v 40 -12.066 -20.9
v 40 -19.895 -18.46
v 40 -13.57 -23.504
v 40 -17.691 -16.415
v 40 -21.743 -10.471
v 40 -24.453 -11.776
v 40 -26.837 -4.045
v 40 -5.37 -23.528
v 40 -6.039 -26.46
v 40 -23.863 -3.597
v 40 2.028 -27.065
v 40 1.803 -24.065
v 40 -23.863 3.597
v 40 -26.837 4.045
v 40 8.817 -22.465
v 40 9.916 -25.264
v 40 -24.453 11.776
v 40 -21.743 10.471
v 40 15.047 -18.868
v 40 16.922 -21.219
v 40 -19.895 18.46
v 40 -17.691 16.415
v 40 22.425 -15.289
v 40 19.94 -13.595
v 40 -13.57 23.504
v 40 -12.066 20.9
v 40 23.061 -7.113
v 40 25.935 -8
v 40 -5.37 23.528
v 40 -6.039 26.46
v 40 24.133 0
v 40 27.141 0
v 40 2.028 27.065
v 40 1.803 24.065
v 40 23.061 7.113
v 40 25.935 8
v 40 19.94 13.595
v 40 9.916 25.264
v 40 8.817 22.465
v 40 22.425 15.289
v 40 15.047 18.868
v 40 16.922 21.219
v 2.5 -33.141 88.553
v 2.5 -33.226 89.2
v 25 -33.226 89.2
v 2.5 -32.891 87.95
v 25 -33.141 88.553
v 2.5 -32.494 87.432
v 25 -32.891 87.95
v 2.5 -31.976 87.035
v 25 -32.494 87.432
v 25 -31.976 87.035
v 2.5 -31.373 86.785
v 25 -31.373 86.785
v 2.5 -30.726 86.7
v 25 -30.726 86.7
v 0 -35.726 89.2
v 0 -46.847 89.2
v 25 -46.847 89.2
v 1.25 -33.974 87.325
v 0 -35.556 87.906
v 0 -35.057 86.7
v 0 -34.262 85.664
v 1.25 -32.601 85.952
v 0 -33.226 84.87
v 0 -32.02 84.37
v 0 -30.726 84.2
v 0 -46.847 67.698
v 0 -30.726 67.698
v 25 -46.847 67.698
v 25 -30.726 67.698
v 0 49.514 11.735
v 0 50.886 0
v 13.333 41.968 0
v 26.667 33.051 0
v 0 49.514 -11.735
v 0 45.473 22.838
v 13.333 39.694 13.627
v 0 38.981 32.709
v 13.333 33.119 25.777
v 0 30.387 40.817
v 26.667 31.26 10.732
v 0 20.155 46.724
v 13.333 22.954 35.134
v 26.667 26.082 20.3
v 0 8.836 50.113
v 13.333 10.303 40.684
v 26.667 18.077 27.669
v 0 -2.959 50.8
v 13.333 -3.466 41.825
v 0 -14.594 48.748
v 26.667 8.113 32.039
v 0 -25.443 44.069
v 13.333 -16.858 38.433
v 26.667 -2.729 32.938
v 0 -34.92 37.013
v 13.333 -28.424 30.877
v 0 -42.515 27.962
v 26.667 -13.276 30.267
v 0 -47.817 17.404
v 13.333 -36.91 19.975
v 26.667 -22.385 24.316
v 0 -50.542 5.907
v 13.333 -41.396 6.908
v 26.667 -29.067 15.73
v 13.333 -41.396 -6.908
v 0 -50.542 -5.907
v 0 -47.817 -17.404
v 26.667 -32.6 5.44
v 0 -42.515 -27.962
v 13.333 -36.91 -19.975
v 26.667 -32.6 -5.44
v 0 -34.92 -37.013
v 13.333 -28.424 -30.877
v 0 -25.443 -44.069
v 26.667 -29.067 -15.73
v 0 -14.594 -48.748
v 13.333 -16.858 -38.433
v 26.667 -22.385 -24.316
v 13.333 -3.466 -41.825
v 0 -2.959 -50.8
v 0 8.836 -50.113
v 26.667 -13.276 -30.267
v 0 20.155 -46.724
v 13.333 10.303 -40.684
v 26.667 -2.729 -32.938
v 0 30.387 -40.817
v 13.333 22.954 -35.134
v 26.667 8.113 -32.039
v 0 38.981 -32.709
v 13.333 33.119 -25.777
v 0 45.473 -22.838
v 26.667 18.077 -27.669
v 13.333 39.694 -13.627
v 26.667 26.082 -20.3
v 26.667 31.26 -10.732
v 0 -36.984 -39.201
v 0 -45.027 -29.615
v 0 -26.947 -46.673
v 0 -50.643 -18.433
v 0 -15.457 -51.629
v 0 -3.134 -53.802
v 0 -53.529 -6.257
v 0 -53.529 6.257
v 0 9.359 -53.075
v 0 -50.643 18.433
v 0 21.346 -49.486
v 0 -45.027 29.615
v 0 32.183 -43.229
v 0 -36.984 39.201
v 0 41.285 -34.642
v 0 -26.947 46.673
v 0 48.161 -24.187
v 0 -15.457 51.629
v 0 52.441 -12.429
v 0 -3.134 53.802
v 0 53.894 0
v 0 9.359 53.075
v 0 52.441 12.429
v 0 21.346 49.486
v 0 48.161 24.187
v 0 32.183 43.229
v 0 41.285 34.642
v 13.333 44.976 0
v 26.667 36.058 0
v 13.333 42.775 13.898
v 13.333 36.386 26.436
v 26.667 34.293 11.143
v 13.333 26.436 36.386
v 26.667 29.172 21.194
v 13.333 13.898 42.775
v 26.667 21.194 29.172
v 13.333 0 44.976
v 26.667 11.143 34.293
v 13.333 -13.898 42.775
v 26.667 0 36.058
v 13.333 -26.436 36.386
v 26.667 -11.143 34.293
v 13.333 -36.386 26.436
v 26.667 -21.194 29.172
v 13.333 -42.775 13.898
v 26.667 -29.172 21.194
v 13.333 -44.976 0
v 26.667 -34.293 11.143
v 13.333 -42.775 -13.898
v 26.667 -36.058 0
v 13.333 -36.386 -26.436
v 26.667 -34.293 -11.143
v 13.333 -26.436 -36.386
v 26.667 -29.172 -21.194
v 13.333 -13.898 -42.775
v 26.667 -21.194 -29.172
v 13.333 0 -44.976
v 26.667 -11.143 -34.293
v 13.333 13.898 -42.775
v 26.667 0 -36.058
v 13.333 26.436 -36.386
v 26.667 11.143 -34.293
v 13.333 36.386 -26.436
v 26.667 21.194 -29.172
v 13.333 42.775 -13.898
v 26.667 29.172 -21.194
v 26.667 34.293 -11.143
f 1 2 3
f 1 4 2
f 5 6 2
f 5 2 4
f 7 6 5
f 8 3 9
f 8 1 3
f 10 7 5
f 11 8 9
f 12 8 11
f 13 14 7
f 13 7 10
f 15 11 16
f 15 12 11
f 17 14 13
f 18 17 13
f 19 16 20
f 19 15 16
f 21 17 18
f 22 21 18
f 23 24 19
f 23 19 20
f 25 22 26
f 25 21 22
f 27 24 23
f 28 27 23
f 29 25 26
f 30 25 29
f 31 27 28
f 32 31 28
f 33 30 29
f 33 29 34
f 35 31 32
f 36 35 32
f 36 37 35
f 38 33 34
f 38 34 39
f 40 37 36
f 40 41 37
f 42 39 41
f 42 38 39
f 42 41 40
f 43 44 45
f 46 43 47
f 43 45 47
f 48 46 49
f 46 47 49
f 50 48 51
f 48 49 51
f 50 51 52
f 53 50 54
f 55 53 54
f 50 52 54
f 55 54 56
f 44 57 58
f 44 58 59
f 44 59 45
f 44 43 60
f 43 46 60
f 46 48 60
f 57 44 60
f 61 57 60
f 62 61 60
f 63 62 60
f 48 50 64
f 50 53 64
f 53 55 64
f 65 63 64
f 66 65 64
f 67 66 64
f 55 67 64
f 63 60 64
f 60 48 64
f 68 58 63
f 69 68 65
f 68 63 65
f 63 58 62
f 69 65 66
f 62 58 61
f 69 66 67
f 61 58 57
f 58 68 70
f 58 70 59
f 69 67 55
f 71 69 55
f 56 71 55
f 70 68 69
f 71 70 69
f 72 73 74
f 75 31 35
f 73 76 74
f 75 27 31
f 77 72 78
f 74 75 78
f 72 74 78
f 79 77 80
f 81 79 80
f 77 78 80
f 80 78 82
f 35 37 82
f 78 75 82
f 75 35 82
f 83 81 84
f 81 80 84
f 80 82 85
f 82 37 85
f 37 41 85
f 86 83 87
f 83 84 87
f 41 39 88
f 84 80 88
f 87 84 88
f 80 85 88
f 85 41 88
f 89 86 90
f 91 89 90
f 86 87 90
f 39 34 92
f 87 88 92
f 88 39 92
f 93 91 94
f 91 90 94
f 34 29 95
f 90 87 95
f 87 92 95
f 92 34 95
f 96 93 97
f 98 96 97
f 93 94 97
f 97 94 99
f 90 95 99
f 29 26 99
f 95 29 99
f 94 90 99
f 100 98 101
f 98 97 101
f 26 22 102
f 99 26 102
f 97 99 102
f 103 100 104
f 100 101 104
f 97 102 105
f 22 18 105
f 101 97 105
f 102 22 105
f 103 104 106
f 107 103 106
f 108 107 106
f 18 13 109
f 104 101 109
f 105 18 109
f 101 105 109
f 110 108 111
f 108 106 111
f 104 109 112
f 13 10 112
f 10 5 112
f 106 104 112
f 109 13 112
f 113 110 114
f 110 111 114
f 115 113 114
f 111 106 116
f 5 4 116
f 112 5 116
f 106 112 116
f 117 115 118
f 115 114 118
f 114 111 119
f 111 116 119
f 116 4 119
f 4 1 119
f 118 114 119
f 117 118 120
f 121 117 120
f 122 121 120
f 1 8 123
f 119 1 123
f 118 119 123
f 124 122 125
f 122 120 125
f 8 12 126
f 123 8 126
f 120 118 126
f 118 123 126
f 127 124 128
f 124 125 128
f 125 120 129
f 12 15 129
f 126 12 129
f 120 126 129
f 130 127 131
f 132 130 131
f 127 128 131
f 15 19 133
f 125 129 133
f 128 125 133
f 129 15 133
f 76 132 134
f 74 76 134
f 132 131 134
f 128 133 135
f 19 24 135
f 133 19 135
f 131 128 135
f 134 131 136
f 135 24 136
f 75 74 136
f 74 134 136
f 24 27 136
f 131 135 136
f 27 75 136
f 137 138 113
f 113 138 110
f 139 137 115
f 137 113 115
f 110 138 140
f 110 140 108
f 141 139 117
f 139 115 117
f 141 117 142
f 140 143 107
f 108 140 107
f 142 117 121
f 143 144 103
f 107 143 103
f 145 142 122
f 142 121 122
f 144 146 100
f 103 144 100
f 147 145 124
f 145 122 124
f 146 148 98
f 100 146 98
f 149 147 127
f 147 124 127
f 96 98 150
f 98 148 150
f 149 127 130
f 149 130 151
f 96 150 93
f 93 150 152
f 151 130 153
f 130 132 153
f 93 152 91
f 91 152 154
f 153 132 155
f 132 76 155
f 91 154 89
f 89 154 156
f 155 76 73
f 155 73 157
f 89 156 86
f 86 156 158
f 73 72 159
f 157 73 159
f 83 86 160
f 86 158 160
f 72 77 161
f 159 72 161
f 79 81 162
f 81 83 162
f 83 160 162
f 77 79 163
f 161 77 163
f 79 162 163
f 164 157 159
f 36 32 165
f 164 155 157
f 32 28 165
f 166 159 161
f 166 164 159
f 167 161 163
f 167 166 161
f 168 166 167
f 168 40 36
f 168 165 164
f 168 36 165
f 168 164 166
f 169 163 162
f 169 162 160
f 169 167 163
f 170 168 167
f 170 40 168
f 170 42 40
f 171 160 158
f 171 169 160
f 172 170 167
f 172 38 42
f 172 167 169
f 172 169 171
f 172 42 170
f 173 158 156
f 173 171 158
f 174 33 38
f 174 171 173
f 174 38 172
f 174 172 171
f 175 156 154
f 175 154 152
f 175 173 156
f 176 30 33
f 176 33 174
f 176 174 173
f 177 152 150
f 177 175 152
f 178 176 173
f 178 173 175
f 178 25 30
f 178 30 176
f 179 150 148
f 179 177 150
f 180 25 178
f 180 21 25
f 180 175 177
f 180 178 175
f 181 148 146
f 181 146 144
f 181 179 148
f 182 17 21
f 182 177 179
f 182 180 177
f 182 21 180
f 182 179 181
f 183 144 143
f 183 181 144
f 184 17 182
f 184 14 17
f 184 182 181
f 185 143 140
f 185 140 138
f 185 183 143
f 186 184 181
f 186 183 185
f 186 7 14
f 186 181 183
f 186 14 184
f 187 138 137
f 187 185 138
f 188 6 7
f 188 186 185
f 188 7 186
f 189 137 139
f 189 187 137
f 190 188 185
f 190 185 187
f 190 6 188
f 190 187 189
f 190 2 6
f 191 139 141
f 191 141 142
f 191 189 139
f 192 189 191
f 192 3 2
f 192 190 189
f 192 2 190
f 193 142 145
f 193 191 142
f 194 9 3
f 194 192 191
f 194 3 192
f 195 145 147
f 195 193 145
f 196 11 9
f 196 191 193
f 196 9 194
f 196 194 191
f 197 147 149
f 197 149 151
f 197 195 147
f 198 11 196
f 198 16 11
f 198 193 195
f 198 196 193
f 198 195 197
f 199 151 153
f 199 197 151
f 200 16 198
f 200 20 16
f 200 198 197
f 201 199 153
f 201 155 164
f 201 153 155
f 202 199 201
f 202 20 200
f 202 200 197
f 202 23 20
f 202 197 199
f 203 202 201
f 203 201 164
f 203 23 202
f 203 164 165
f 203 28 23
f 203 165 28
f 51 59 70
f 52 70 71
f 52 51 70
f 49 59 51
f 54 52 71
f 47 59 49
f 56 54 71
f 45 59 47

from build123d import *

# Parameters (mm, degrees)
F0_R           = 53.8935696429
F2_R           = 27.1405694362
F4_T           = -2.5
F5_W           = 16.1205343902
F5_H           = 21.5015411377
F6_DEPTH       = 25
F7_D           = 5
F7_CSINK_D     = 10
F7_CSINK_ANGLE = 90


with BuildPart() as f3:
    # F0 (on Right) → F3 section 0
    with BuildSketch(Plane.YZ):
        Circle(F0_R)
    # F2 (on offset) → F3 section 1
    with BuildSketch(Plane.YZ.offset(40)):
        Circle(F2_R)
    loft()

    # F4
    f4_openings = [f3.faces().sort_by_distance(p)[0] for p in [
        (40, 0, 0),
        (0, 0, 0),
    ]]
    offset(amount=F4_T, openings=f4_openings, kind=Kind.INTERSECTION)


with BuildPart() as f6:
    # F5 (on Right) → F6 (new body)
    with BuildSketch(Plane.YZ):
        with Locations((-38.7866627425, 78.4489735961)):
            Rectangle(F5_W, F5_H)
    extrude(amount=F6_DEPTH)

    # F7 (through all)
    with Locations(Plane(origin=(0, 0, 0), x_dir=(0, 1, 0), z_dir=(-1, 0, 0))):
        with Locations((-30.7263955474, -89.1997441649)):
            CounterSinkHole(F7_D / 2, F7_CSINK_D / 2, counter_sink_angle=F7_CSINK_ANGLE)


solid = Compound([f3.part, f6.part])
